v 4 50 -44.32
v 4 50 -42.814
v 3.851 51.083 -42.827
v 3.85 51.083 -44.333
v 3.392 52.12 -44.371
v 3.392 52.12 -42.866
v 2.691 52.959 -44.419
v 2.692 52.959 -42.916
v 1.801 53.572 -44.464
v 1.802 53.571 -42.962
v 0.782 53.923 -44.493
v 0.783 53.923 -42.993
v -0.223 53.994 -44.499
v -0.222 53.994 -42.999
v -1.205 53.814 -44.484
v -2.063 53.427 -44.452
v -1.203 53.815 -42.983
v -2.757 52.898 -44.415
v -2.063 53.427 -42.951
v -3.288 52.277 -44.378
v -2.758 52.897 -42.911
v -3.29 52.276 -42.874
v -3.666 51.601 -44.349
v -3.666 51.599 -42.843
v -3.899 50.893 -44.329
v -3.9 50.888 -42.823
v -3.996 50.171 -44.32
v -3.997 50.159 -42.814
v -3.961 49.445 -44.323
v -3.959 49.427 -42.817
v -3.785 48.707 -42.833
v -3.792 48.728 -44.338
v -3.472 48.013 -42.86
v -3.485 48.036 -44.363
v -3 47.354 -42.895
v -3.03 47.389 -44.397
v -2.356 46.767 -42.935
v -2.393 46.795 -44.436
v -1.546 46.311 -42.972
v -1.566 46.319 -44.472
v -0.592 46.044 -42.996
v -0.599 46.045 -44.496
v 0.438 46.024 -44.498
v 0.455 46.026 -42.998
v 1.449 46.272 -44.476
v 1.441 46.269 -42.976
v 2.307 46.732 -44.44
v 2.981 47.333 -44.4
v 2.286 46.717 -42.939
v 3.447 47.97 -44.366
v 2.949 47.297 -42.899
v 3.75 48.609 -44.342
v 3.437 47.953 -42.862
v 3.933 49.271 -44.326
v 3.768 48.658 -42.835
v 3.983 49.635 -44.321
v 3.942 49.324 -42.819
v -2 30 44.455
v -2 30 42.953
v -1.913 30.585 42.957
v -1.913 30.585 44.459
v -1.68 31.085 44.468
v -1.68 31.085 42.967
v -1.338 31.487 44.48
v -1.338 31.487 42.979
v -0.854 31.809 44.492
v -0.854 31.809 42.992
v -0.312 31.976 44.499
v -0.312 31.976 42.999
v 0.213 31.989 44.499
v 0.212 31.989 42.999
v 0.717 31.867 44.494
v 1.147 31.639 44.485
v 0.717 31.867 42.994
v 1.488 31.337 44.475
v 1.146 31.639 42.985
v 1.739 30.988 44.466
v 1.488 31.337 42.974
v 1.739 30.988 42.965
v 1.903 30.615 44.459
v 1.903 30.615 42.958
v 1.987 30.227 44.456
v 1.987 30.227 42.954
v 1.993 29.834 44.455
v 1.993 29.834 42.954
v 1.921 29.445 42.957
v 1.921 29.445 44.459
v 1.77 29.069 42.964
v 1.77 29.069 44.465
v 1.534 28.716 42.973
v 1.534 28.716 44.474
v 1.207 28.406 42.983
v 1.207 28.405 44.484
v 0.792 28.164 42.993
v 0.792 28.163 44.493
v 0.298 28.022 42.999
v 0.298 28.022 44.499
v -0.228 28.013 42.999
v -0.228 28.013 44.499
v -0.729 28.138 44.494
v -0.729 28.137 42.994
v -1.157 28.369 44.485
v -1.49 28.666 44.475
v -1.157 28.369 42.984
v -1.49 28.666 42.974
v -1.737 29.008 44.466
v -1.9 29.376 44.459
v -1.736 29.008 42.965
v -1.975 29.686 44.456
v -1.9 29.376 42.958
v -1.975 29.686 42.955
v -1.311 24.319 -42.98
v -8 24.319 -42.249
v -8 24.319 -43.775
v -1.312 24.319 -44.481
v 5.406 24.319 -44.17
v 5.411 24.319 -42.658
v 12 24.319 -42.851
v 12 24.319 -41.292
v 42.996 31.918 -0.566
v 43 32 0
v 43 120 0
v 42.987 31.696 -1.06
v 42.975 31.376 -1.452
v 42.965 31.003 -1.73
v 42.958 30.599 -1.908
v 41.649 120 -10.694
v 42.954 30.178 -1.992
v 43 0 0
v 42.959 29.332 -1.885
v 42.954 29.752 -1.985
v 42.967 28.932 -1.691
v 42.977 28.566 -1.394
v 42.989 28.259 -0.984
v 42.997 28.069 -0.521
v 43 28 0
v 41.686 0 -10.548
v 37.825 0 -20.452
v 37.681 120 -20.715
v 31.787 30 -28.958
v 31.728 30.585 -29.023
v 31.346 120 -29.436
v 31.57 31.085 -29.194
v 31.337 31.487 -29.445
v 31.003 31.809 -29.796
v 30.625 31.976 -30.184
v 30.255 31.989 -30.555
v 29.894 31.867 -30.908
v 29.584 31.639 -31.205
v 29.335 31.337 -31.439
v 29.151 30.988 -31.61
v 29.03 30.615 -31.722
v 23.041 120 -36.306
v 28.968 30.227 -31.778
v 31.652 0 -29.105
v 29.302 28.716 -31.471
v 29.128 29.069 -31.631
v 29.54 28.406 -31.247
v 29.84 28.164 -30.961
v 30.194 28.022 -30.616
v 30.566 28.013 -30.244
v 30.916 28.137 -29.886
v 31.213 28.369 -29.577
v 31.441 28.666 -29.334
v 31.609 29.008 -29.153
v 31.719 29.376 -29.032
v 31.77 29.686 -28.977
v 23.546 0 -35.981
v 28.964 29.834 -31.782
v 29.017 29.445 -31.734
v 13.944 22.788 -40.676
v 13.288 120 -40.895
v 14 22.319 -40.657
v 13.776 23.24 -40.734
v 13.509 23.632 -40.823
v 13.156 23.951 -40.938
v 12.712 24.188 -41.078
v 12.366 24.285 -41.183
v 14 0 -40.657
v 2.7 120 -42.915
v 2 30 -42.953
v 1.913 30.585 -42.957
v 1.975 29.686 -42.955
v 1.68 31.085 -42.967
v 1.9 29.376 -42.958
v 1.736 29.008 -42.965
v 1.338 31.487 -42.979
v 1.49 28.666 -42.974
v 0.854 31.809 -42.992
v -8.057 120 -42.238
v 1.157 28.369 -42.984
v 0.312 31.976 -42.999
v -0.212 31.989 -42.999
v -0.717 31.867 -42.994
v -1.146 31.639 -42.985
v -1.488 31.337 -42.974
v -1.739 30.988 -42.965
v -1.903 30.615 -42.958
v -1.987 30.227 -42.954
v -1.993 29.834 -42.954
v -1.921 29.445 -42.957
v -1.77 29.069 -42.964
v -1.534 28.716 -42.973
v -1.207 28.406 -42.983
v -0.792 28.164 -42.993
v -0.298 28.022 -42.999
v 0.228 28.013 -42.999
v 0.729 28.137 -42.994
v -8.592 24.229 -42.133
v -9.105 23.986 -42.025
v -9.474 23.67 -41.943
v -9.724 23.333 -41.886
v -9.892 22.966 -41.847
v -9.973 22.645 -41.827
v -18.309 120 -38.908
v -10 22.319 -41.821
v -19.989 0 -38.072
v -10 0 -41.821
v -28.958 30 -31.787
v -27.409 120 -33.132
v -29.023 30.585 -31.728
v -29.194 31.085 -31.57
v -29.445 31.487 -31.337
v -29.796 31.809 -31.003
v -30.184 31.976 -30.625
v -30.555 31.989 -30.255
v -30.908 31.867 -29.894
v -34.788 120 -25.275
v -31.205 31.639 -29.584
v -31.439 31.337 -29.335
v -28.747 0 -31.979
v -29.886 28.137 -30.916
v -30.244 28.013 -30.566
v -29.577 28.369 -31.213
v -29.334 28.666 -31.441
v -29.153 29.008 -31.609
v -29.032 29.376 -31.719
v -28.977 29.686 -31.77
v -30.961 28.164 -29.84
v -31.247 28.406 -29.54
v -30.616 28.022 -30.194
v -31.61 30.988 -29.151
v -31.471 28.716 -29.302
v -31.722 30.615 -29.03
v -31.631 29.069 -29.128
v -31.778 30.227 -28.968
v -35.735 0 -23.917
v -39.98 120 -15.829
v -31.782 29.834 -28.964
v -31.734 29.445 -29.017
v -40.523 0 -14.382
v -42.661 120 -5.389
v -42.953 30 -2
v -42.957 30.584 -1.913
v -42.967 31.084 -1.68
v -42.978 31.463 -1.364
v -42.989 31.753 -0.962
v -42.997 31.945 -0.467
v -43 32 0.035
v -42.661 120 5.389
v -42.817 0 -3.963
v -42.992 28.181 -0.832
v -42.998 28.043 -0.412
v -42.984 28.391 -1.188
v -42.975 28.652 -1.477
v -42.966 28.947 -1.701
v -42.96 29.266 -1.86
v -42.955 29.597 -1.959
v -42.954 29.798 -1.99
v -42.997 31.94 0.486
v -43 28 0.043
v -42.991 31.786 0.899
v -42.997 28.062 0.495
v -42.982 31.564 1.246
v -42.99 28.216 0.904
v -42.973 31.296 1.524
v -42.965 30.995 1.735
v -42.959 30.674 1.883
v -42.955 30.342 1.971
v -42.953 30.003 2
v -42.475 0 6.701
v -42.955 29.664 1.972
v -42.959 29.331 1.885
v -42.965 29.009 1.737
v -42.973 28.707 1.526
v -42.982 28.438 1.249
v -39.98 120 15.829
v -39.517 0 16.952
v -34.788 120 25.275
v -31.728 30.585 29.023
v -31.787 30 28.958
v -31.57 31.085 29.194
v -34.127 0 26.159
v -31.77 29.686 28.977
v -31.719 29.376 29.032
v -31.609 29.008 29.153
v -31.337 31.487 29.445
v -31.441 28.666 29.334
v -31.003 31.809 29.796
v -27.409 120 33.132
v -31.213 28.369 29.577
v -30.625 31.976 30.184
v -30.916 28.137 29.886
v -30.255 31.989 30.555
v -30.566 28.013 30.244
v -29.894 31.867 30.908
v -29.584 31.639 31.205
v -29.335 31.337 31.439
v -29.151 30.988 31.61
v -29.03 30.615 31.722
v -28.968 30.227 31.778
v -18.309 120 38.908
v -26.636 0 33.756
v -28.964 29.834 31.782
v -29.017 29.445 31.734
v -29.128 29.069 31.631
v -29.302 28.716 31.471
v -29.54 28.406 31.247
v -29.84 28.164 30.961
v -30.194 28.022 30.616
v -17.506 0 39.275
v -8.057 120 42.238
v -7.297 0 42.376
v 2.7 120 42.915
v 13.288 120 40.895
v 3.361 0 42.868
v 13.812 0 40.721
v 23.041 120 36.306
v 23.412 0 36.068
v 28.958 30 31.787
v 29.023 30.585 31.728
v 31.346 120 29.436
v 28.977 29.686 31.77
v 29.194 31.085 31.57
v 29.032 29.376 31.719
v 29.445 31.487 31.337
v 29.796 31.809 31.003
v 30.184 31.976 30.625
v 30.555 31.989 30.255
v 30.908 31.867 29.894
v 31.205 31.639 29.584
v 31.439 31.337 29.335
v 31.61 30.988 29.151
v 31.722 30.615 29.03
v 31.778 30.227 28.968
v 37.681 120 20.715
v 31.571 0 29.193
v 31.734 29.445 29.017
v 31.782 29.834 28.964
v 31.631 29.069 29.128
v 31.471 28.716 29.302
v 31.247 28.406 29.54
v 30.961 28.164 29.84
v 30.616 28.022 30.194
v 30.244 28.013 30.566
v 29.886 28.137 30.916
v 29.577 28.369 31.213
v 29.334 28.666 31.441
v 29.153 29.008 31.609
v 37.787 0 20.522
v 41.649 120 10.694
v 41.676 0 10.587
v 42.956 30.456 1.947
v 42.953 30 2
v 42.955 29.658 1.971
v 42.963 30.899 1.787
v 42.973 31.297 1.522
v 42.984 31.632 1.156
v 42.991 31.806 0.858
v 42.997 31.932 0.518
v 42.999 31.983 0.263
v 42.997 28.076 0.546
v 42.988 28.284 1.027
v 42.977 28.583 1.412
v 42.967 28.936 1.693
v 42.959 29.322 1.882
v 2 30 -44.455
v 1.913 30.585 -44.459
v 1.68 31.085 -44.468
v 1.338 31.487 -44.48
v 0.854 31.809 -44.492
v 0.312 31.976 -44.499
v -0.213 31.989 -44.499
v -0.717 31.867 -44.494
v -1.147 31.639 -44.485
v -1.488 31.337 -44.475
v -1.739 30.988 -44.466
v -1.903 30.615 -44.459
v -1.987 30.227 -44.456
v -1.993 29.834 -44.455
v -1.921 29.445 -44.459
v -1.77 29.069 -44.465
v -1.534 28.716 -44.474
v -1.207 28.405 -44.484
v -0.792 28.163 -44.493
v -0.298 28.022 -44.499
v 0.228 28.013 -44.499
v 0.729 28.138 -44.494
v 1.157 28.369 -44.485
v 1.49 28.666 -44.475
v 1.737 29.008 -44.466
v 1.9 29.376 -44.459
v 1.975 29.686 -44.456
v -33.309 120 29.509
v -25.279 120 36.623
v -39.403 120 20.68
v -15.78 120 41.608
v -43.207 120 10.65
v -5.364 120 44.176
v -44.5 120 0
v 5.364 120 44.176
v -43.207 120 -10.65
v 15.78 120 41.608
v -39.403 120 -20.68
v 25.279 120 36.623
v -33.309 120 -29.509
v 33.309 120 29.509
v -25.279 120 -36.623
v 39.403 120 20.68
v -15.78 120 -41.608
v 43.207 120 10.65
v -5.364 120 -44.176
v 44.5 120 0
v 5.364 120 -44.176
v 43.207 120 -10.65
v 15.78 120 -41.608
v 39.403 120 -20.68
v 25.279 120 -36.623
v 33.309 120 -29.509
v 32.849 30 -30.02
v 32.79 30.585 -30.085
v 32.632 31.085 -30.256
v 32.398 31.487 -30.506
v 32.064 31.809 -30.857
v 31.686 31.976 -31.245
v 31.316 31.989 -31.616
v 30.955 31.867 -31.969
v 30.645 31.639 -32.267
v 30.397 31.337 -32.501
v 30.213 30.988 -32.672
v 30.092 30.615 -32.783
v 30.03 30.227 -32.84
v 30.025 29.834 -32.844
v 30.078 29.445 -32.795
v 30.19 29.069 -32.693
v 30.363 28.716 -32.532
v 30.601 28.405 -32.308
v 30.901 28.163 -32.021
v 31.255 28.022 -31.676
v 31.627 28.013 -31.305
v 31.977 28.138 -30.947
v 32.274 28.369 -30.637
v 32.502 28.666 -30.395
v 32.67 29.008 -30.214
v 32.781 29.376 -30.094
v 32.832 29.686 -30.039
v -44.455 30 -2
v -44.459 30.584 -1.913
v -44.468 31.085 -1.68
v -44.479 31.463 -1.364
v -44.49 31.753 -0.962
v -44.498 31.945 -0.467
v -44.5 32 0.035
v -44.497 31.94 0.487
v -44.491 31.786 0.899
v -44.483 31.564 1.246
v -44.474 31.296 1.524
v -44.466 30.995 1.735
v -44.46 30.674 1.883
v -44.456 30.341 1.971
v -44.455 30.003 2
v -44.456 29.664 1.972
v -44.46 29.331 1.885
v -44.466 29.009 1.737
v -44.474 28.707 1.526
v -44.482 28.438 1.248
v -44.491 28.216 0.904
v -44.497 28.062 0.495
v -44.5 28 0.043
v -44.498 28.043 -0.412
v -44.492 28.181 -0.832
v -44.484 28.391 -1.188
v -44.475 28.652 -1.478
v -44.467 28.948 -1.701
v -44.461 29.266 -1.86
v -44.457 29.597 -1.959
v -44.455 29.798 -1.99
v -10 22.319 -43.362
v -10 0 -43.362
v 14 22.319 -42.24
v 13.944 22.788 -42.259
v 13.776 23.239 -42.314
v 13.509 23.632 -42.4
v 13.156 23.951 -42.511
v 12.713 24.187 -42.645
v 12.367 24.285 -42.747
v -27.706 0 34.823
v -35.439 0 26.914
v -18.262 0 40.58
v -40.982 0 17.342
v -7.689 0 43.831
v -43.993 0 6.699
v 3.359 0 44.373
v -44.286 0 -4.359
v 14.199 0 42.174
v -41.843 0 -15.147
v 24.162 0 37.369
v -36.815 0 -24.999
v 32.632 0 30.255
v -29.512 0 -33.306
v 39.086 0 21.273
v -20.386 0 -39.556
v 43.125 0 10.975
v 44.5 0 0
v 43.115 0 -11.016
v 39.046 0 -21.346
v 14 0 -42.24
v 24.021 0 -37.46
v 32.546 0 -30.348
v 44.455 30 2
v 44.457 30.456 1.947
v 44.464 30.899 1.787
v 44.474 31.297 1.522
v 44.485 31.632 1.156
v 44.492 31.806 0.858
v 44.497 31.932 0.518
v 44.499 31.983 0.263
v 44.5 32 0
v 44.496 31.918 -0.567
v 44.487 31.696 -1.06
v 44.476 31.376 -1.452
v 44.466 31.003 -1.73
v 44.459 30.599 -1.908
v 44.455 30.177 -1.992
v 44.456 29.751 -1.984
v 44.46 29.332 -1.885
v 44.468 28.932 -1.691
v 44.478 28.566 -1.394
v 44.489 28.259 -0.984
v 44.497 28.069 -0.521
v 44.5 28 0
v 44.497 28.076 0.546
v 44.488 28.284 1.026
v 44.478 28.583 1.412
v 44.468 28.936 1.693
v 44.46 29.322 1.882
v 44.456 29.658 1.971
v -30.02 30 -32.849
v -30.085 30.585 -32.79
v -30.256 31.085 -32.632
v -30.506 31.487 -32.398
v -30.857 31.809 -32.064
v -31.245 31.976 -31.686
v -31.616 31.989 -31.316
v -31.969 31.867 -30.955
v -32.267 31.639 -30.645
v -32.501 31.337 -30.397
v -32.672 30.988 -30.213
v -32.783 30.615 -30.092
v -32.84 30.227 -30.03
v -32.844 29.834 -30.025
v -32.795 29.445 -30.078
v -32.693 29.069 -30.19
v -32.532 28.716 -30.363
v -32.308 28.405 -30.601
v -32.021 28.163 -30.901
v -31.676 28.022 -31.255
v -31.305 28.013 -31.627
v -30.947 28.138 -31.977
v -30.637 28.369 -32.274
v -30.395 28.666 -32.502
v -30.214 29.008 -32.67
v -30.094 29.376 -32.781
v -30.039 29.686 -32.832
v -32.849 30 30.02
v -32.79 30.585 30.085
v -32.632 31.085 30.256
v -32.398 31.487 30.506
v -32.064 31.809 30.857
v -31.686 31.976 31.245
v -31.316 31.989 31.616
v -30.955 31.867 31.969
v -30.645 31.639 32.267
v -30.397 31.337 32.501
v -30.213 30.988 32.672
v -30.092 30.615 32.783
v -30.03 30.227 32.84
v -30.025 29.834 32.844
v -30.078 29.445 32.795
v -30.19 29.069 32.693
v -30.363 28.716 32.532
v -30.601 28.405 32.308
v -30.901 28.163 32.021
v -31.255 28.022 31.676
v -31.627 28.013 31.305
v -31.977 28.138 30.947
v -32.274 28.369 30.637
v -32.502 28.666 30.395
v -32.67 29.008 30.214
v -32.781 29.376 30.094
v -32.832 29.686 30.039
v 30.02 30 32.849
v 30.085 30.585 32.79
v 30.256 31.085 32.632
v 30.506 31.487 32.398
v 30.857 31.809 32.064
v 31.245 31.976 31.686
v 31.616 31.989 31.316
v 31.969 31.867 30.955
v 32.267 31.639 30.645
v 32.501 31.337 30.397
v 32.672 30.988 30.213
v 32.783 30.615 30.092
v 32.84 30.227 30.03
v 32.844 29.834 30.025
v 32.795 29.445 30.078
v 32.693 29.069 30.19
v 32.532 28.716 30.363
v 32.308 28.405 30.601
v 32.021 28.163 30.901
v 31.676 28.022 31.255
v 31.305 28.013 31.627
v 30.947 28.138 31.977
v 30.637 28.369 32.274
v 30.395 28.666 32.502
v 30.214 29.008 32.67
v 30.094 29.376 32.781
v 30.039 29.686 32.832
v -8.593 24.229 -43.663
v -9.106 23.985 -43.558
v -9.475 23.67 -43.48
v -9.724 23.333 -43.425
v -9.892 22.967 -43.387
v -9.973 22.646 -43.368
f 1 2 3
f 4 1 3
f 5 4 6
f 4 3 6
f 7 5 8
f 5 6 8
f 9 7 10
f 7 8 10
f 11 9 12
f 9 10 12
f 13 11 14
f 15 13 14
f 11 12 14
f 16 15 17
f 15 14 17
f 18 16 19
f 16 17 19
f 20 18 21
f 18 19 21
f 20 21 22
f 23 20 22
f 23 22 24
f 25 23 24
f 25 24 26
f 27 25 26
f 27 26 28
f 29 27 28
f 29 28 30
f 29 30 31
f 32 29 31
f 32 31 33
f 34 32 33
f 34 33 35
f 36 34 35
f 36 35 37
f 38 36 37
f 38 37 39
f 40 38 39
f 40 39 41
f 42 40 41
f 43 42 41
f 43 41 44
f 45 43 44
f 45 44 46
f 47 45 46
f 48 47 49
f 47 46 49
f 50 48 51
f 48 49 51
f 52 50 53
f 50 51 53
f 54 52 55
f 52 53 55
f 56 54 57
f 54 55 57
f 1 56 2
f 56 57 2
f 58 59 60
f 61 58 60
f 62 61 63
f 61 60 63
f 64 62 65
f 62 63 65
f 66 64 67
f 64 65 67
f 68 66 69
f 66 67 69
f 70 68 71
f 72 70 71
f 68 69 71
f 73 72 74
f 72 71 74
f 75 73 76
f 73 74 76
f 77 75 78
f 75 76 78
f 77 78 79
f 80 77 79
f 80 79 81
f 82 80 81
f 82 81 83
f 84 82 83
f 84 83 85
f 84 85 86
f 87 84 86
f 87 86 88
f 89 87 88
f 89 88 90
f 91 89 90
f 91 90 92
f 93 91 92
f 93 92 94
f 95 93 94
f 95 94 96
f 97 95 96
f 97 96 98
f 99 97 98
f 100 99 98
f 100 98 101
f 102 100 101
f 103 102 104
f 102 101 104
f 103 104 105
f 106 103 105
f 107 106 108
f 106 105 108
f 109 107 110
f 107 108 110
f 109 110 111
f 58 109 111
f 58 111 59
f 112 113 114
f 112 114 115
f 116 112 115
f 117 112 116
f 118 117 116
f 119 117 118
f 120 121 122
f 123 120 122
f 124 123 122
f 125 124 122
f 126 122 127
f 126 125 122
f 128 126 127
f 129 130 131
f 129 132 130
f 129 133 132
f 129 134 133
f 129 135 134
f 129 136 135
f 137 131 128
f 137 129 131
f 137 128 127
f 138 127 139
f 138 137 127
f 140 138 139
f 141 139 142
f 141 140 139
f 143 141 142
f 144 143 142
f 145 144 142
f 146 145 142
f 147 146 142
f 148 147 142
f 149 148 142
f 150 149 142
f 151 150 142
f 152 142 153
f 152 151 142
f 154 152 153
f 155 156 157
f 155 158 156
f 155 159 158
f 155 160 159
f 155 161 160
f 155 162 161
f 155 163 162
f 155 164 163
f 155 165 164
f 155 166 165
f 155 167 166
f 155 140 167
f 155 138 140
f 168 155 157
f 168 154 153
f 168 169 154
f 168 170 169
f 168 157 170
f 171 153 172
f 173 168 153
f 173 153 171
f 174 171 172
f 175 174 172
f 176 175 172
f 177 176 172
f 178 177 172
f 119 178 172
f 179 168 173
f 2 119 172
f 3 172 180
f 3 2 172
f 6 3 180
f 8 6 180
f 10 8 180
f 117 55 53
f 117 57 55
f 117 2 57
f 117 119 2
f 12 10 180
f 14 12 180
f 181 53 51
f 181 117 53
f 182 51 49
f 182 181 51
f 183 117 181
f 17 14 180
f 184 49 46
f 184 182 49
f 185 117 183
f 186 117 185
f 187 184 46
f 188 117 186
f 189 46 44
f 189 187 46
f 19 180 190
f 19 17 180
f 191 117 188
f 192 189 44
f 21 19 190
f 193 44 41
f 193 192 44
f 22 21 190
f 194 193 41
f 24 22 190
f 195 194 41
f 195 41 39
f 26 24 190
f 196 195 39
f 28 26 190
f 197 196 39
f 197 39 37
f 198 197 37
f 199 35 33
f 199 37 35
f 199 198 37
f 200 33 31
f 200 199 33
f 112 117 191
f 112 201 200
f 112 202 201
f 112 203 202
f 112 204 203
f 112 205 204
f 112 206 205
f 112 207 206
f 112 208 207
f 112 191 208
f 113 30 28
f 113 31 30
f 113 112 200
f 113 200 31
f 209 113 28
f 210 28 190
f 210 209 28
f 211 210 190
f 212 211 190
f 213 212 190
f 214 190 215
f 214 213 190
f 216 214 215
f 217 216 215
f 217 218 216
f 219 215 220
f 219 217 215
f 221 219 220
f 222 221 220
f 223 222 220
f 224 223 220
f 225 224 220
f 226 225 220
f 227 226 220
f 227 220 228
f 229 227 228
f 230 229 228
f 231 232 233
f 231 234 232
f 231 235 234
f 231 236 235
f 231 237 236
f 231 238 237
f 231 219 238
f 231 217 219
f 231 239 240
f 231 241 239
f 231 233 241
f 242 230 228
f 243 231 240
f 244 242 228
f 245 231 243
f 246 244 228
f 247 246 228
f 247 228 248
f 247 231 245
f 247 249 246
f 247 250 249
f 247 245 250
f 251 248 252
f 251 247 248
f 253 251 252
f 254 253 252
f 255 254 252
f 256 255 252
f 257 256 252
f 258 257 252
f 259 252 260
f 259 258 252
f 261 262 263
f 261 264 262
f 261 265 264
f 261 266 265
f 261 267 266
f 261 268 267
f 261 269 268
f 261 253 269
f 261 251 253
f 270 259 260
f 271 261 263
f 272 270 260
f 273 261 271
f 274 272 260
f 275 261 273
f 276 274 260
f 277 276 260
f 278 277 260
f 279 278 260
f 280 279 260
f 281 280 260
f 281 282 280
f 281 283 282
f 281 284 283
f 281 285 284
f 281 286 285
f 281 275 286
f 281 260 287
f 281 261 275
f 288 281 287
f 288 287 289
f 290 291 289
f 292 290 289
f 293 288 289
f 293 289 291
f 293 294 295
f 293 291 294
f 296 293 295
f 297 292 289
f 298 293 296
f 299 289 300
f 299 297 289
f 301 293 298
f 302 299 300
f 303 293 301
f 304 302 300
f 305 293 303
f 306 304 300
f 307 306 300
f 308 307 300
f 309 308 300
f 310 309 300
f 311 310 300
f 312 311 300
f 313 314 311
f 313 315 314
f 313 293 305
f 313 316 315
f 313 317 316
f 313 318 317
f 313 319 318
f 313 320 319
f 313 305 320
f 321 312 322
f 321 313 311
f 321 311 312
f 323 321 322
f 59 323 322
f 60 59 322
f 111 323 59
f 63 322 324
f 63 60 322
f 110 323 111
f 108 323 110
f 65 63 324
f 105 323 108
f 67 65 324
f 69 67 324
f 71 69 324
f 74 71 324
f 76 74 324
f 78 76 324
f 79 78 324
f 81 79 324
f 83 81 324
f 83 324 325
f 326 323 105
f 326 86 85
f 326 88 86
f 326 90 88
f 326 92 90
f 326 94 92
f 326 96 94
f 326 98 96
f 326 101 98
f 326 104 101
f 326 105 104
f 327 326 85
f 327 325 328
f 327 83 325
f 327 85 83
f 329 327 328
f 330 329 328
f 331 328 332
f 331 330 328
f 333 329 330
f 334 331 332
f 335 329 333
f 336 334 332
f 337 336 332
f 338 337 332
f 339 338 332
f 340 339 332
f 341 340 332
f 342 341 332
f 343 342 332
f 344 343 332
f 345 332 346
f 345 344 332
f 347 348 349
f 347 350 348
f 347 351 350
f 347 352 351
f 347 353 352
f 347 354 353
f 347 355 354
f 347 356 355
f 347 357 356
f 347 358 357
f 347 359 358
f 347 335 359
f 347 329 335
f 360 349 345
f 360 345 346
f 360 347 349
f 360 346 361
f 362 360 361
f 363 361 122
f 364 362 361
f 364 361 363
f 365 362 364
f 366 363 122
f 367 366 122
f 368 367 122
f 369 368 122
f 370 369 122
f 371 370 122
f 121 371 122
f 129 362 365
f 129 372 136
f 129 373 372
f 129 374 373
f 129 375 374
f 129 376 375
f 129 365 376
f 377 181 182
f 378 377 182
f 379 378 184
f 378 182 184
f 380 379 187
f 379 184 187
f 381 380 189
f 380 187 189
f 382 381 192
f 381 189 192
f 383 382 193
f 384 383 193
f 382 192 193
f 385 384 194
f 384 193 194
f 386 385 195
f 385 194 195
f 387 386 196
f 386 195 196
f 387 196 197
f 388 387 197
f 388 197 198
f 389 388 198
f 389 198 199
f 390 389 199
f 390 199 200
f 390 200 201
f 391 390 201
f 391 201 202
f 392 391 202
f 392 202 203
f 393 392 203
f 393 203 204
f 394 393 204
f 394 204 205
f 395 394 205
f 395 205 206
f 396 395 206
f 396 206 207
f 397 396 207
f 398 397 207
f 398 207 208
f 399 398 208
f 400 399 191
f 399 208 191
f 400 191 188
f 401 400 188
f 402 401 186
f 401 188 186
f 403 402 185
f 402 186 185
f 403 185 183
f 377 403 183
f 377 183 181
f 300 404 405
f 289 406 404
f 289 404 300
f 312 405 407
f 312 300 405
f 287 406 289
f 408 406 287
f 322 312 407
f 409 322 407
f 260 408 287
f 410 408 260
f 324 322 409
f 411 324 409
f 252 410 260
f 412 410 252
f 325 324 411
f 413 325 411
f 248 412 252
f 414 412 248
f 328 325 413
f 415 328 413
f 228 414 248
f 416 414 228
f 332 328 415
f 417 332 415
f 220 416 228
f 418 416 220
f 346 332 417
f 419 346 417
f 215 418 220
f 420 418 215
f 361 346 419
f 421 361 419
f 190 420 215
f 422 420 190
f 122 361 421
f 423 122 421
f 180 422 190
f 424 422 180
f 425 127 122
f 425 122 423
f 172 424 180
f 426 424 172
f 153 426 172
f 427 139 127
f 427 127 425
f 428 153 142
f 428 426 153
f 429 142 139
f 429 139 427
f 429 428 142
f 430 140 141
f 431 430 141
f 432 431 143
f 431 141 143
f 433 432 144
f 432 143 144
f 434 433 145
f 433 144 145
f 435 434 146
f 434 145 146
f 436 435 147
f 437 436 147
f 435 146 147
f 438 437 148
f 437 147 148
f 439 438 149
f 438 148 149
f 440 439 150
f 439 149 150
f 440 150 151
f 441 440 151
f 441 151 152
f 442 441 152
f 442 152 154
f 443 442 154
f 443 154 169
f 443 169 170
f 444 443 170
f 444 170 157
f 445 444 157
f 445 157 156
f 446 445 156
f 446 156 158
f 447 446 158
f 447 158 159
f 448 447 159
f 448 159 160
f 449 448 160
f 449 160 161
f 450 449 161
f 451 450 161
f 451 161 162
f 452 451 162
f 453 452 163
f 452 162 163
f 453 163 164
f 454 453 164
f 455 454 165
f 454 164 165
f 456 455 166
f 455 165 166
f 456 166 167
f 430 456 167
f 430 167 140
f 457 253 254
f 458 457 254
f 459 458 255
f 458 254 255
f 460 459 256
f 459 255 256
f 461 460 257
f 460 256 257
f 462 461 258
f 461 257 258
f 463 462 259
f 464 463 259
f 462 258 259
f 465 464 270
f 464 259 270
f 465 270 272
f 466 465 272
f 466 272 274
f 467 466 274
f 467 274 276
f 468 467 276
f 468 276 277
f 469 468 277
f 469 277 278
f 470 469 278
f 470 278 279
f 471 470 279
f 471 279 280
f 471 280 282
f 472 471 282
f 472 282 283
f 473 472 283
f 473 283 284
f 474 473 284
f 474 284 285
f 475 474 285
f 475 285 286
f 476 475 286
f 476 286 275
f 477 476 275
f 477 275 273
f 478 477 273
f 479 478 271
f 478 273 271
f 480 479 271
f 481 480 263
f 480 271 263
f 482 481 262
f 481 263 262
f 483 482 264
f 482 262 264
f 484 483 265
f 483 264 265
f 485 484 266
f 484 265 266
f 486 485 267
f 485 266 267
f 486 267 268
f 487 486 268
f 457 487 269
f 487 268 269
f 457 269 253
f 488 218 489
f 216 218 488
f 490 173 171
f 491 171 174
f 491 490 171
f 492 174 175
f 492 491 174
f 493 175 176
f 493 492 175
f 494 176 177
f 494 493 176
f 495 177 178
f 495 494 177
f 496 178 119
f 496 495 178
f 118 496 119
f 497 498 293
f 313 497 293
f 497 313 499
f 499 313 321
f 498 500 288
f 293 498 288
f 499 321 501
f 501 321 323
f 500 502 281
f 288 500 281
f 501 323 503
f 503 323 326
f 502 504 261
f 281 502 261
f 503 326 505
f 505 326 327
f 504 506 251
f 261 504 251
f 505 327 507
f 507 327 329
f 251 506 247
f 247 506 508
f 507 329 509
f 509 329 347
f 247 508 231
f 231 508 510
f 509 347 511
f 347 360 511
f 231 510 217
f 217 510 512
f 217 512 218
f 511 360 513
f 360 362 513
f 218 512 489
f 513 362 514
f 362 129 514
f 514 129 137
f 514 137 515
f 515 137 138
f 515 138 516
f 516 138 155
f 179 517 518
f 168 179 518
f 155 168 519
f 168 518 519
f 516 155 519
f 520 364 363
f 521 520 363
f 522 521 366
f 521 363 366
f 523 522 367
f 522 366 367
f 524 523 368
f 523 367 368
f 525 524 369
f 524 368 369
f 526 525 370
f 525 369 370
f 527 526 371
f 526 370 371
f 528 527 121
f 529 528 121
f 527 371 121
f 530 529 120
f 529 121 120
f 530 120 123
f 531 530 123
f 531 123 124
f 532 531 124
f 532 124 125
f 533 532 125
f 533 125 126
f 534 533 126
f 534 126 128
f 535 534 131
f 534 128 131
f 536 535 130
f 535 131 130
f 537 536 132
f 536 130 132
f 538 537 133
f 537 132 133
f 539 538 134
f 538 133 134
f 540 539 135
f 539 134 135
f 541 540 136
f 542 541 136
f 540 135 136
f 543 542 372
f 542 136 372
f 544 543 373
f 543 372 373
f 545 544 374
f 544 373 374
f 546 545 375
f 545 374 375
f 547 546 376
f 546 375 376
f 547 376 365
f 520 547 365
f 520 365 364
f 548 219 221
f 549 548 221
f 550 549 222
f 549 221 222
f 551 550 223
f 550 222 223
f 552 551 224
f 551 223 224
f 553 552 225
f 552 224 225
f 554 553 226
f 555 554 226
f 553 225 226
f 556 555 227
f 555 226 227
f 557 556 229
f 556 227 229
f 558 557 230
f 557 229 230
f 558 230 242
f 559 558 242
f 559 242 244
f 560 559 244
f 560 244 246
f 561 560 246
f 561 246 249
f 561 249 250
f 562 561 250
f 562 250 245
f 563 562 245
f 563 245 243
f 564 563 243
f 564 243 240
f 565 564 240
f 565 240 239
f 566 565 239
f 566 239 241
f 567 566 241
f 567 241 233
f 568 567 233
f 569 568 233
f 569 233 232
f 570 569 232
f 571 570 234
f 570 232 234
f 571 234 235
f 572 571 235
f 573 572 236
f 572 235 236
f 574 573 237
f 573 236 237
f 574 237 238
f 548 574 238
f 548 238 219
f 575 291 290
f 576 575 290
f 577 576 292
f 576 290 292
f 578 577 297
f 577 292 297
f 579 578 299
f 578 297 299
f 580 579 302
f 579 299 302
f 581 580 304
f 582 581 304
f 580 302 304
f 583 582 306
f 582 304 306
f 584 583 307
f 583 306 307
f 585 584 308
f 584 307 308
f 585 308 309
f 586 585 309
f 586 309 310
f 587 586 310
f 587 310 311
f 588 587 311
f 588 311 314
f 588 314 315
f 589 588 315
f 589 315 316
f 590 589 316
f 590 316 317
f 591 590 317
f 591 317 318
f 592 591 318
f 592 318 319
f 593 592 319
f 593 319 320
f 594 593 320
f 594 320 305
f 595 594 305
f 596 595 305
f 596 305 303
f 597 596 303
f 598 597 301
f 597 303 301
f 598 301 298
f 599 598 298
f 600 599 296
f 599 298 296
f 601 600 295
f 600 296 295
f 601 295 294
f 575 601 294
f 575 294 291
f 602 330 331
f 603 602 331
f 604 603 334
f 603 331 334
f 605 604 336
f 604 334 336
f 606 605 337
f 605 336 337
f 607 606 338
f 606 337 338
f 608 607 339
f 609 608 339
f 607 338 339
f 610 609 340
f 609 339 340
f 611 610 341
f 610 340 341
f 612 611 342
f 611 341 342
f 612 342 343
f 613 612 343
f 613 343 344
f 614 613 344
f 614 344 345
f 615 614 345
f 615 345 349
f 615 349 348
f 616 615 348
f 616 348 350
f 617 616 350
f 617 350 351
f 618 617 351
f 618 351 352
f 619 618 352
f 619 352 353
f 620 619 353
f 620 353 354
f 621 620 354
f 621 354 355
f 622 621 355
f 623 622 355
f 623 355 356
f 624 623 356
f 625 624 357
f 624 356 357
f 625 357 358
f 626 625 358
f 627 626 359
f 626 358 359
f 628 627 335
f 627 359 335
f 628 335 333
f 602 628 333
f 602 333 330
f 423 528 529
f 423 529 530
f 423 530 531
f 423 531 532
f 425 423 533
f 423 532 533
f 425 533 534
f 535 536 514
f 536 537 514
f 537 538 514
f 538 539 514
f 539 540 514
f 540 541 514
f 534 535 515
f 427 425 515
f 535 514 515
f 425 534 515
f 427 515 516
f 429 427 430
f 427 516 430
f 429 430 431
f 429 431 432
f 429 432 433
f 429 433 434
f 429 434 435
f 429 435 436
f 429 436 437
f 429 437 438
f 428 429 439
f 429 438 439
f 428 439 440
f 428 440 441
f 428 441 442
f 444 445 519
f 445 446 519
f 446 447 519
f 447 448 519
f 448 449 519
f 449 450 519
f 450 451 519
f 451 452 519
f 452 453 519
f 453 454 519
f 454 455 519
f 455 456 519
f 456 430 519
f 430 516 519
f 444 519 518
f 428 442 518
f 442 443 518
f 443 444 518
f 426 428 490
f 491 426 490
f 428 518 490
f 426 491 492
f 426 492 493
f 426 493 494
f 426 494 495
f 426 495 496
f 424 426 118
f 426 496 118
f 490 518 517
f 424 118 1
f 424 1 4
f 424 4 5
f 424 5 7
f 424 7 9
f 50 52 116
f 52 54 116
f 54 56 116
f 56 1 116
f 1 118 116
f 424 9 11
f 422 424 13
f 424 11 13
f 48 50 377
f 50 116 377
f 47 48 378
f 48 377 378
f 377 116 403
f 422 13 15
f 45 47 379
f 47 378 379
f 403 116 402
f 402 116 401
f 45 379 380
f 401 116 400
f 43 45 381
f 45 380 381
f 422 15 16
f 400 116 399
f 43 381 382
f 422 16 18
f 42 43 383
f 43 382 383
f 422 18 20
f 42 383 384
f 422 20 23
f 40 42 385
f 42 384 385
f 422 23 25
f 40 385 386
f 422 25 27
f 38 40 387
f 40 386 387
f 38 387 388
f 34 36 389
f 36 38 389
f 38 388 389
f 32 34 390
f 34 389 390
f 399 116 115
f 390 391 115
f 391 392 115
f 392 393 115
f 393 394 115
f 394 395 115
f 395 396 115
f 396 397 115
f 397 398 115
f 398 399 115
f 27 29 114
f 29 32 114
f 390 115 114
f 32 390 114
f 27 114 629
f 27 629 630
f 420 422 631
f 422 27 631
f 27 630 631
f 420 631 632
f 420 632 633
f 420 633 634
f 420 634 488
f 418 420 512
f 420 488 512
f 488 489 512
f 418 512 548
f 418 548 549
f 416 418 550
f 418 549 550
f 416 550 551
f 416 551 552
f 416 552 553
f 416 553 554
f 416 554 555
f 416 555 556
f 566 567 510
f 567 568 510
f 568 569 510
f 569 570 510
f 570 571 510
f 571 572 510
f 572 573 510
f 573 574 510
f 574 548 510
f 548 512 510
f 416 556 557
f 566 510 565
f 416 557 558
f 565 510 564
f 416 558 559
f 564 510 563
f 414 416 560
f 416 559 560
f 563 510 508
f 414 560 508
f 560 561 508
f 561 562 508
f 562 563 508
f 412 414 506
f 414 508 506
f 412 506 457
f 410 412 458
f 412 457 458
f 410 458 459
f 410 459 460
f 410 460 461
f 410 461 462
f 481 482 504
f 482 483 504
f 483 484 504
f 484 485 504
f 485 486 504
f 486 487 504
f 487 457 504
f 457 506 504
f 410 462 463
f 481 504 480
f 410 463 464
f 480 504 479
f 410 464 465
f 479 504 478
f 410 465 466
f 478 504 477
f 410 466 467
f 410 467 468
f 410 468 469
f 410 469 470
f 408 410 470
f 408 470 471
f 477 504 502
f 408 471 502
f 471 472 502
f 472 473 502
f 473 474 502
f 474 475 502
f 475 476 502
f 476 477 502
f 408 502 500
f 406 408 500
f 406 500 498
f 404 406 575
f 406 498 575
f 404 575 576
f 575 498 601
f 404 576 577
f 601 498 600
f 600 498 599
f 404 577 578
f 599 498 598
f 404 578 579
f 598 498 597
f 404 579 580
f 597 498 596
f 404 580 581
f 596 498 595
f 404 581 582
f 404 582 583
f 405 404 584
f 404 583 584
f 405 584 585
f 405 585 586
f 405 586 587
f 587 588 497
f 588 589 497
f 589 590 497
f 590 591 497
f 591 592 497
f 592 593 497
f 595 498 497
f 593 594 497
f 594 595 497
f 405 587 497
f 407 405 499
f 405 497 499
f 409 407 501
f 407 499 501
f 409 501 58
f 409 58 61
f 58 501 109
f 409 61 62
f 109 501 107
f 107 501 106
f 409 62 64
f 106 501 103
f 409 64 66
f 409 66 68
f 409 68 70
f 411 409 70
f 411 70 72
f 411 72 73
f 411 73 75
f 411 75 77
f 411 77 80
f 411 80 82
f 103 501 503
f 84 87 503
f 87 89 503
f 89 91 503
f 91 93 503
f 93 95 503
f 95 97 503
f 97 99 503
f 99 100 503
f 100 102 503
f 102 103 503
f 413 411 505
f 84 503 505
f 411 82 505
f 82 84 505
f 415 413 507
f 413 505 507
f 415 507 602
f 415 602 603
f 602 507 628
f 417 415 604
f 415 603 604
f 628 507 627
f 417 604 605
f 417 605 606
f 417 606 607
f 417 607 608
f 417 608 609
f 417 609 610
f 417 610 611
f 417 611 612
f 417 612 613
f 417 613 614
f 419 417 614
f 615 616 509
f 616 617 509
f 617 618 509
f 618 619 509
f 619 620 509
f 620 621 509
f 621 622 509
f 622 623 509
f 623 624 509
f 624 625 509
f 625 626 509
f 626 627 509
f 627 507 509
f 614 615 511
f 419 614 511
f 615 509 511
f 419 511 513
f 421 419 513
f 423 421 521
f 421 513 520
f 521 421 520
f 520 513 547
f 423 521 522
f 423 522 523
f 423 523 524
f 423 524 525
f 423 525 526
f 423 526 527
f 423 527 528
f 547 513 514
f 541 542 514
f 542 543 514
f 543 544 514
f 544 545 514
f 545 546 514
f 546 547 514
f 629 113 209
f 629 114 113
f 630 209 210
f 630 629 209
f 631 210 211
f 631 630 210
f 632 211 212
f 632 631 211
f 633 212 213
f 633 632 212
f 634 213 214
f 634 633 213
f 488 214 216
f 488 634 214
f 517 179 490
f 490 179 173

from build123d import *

# Parameters (mm, degrees)
SKIZZE1_R                       = 44.5
SKIZZE1_R_2                     = 43
AUFSATZ_LINEAR_AUSTRAGEN1_DEPTH = 120
SKIZZE2_R                       = 4
SCHNITT_LINEAR_AUSTRAGEN1_DEPTH = 45.5
SKIZZE3_R                       = 2
SCHNITT_LINEAR_AUSTRAGEN2_DEPTH = 45.5000001
KREISMUSTER1_COUNT              = 8
SKIZZE4_W                       = 24
SKIZZE4_H                       = 24.318999769
SCHNITT_LINEAR_AUSTRAGEN3_DEPTH = 45.50000012
VERRUNDUNG1_R                   = 2


with BuildPart() as part:
    # Skizze1 → Aufsatz-Linear austragen1 (new body)
    with BuildSketch(Plane(origin=(0, 0, 0), x_dir=(1, 0, 0), z_dir=(0, 1, 0))):
        Circle(SKIZZE1_R)
        Circle(SKIZZE1_R_2, mode=Mode.SUBTRACT)
    extrude(amount=AUFSATZ_LINEAR_AUSTRAGEN1_DEPTH)

    # Skizze2 → Schnitt-Linear austragen1 (cut, through all)
    with BuildSketch(Plane.XY):
        with Locations((0, 50)):
            Circle(SKIZZE2_R)
    extrude(amount=-SCHNITT_LINEAR_AUSTRAGEN1_DEPTH, mode=Mode.SUBTRACT)

    # Skizze3 → Schnitt-Linear austragen2 (cut, through all)
    with BuildSketch(Plane.XY):
        with Locations((0, 30)):
            Circle(SKIZZE3_R)
    schnitt_linear_austragen2 = extrude(amount=-SCHNITT_LINEAR_AUSTRAGEN2_DEPTH, mode=Mode.SUBTRACT)

    # Kreismuster1: Schnitt-Linear austragen2 ×8 about axis
    kreismuster1_axis = Axis((0, 120, 0), (0, -1, 0))
    for i in range(1, KREISMUSTER1_COUNT):
        add(schnitt_linear_austragen2.rotate(kreismuster1_axis, i * 360 / KREISMUSTER1_COUNT), mode=Mode.SUBTRACT)

    # Skizze4 → Schnitt-Linear austragen3 (cut, through all)
    with BuildSketch(Plane.XY):
        with Locations((2, 12.159499885)):
            Rectangle(SKIZZE4_W, SKIZZE4_H)
    extrude(amount=-SCHNITT_LINEAR_AUSTRAGEN3_DEPTH, mode=Mode.SUBTRACT)

    # Verrundung1
    verrundung1_edges = [part.edges().sort_by_distance(p)[0] for p in [
        (-10, 24.318999769, -42.591448462),
        (14, 24.318999769, -41.448743111),
    ]]
    fillet(verrundung1_edges, radius=VERRUNDUNG1_R)


solid = part.part
